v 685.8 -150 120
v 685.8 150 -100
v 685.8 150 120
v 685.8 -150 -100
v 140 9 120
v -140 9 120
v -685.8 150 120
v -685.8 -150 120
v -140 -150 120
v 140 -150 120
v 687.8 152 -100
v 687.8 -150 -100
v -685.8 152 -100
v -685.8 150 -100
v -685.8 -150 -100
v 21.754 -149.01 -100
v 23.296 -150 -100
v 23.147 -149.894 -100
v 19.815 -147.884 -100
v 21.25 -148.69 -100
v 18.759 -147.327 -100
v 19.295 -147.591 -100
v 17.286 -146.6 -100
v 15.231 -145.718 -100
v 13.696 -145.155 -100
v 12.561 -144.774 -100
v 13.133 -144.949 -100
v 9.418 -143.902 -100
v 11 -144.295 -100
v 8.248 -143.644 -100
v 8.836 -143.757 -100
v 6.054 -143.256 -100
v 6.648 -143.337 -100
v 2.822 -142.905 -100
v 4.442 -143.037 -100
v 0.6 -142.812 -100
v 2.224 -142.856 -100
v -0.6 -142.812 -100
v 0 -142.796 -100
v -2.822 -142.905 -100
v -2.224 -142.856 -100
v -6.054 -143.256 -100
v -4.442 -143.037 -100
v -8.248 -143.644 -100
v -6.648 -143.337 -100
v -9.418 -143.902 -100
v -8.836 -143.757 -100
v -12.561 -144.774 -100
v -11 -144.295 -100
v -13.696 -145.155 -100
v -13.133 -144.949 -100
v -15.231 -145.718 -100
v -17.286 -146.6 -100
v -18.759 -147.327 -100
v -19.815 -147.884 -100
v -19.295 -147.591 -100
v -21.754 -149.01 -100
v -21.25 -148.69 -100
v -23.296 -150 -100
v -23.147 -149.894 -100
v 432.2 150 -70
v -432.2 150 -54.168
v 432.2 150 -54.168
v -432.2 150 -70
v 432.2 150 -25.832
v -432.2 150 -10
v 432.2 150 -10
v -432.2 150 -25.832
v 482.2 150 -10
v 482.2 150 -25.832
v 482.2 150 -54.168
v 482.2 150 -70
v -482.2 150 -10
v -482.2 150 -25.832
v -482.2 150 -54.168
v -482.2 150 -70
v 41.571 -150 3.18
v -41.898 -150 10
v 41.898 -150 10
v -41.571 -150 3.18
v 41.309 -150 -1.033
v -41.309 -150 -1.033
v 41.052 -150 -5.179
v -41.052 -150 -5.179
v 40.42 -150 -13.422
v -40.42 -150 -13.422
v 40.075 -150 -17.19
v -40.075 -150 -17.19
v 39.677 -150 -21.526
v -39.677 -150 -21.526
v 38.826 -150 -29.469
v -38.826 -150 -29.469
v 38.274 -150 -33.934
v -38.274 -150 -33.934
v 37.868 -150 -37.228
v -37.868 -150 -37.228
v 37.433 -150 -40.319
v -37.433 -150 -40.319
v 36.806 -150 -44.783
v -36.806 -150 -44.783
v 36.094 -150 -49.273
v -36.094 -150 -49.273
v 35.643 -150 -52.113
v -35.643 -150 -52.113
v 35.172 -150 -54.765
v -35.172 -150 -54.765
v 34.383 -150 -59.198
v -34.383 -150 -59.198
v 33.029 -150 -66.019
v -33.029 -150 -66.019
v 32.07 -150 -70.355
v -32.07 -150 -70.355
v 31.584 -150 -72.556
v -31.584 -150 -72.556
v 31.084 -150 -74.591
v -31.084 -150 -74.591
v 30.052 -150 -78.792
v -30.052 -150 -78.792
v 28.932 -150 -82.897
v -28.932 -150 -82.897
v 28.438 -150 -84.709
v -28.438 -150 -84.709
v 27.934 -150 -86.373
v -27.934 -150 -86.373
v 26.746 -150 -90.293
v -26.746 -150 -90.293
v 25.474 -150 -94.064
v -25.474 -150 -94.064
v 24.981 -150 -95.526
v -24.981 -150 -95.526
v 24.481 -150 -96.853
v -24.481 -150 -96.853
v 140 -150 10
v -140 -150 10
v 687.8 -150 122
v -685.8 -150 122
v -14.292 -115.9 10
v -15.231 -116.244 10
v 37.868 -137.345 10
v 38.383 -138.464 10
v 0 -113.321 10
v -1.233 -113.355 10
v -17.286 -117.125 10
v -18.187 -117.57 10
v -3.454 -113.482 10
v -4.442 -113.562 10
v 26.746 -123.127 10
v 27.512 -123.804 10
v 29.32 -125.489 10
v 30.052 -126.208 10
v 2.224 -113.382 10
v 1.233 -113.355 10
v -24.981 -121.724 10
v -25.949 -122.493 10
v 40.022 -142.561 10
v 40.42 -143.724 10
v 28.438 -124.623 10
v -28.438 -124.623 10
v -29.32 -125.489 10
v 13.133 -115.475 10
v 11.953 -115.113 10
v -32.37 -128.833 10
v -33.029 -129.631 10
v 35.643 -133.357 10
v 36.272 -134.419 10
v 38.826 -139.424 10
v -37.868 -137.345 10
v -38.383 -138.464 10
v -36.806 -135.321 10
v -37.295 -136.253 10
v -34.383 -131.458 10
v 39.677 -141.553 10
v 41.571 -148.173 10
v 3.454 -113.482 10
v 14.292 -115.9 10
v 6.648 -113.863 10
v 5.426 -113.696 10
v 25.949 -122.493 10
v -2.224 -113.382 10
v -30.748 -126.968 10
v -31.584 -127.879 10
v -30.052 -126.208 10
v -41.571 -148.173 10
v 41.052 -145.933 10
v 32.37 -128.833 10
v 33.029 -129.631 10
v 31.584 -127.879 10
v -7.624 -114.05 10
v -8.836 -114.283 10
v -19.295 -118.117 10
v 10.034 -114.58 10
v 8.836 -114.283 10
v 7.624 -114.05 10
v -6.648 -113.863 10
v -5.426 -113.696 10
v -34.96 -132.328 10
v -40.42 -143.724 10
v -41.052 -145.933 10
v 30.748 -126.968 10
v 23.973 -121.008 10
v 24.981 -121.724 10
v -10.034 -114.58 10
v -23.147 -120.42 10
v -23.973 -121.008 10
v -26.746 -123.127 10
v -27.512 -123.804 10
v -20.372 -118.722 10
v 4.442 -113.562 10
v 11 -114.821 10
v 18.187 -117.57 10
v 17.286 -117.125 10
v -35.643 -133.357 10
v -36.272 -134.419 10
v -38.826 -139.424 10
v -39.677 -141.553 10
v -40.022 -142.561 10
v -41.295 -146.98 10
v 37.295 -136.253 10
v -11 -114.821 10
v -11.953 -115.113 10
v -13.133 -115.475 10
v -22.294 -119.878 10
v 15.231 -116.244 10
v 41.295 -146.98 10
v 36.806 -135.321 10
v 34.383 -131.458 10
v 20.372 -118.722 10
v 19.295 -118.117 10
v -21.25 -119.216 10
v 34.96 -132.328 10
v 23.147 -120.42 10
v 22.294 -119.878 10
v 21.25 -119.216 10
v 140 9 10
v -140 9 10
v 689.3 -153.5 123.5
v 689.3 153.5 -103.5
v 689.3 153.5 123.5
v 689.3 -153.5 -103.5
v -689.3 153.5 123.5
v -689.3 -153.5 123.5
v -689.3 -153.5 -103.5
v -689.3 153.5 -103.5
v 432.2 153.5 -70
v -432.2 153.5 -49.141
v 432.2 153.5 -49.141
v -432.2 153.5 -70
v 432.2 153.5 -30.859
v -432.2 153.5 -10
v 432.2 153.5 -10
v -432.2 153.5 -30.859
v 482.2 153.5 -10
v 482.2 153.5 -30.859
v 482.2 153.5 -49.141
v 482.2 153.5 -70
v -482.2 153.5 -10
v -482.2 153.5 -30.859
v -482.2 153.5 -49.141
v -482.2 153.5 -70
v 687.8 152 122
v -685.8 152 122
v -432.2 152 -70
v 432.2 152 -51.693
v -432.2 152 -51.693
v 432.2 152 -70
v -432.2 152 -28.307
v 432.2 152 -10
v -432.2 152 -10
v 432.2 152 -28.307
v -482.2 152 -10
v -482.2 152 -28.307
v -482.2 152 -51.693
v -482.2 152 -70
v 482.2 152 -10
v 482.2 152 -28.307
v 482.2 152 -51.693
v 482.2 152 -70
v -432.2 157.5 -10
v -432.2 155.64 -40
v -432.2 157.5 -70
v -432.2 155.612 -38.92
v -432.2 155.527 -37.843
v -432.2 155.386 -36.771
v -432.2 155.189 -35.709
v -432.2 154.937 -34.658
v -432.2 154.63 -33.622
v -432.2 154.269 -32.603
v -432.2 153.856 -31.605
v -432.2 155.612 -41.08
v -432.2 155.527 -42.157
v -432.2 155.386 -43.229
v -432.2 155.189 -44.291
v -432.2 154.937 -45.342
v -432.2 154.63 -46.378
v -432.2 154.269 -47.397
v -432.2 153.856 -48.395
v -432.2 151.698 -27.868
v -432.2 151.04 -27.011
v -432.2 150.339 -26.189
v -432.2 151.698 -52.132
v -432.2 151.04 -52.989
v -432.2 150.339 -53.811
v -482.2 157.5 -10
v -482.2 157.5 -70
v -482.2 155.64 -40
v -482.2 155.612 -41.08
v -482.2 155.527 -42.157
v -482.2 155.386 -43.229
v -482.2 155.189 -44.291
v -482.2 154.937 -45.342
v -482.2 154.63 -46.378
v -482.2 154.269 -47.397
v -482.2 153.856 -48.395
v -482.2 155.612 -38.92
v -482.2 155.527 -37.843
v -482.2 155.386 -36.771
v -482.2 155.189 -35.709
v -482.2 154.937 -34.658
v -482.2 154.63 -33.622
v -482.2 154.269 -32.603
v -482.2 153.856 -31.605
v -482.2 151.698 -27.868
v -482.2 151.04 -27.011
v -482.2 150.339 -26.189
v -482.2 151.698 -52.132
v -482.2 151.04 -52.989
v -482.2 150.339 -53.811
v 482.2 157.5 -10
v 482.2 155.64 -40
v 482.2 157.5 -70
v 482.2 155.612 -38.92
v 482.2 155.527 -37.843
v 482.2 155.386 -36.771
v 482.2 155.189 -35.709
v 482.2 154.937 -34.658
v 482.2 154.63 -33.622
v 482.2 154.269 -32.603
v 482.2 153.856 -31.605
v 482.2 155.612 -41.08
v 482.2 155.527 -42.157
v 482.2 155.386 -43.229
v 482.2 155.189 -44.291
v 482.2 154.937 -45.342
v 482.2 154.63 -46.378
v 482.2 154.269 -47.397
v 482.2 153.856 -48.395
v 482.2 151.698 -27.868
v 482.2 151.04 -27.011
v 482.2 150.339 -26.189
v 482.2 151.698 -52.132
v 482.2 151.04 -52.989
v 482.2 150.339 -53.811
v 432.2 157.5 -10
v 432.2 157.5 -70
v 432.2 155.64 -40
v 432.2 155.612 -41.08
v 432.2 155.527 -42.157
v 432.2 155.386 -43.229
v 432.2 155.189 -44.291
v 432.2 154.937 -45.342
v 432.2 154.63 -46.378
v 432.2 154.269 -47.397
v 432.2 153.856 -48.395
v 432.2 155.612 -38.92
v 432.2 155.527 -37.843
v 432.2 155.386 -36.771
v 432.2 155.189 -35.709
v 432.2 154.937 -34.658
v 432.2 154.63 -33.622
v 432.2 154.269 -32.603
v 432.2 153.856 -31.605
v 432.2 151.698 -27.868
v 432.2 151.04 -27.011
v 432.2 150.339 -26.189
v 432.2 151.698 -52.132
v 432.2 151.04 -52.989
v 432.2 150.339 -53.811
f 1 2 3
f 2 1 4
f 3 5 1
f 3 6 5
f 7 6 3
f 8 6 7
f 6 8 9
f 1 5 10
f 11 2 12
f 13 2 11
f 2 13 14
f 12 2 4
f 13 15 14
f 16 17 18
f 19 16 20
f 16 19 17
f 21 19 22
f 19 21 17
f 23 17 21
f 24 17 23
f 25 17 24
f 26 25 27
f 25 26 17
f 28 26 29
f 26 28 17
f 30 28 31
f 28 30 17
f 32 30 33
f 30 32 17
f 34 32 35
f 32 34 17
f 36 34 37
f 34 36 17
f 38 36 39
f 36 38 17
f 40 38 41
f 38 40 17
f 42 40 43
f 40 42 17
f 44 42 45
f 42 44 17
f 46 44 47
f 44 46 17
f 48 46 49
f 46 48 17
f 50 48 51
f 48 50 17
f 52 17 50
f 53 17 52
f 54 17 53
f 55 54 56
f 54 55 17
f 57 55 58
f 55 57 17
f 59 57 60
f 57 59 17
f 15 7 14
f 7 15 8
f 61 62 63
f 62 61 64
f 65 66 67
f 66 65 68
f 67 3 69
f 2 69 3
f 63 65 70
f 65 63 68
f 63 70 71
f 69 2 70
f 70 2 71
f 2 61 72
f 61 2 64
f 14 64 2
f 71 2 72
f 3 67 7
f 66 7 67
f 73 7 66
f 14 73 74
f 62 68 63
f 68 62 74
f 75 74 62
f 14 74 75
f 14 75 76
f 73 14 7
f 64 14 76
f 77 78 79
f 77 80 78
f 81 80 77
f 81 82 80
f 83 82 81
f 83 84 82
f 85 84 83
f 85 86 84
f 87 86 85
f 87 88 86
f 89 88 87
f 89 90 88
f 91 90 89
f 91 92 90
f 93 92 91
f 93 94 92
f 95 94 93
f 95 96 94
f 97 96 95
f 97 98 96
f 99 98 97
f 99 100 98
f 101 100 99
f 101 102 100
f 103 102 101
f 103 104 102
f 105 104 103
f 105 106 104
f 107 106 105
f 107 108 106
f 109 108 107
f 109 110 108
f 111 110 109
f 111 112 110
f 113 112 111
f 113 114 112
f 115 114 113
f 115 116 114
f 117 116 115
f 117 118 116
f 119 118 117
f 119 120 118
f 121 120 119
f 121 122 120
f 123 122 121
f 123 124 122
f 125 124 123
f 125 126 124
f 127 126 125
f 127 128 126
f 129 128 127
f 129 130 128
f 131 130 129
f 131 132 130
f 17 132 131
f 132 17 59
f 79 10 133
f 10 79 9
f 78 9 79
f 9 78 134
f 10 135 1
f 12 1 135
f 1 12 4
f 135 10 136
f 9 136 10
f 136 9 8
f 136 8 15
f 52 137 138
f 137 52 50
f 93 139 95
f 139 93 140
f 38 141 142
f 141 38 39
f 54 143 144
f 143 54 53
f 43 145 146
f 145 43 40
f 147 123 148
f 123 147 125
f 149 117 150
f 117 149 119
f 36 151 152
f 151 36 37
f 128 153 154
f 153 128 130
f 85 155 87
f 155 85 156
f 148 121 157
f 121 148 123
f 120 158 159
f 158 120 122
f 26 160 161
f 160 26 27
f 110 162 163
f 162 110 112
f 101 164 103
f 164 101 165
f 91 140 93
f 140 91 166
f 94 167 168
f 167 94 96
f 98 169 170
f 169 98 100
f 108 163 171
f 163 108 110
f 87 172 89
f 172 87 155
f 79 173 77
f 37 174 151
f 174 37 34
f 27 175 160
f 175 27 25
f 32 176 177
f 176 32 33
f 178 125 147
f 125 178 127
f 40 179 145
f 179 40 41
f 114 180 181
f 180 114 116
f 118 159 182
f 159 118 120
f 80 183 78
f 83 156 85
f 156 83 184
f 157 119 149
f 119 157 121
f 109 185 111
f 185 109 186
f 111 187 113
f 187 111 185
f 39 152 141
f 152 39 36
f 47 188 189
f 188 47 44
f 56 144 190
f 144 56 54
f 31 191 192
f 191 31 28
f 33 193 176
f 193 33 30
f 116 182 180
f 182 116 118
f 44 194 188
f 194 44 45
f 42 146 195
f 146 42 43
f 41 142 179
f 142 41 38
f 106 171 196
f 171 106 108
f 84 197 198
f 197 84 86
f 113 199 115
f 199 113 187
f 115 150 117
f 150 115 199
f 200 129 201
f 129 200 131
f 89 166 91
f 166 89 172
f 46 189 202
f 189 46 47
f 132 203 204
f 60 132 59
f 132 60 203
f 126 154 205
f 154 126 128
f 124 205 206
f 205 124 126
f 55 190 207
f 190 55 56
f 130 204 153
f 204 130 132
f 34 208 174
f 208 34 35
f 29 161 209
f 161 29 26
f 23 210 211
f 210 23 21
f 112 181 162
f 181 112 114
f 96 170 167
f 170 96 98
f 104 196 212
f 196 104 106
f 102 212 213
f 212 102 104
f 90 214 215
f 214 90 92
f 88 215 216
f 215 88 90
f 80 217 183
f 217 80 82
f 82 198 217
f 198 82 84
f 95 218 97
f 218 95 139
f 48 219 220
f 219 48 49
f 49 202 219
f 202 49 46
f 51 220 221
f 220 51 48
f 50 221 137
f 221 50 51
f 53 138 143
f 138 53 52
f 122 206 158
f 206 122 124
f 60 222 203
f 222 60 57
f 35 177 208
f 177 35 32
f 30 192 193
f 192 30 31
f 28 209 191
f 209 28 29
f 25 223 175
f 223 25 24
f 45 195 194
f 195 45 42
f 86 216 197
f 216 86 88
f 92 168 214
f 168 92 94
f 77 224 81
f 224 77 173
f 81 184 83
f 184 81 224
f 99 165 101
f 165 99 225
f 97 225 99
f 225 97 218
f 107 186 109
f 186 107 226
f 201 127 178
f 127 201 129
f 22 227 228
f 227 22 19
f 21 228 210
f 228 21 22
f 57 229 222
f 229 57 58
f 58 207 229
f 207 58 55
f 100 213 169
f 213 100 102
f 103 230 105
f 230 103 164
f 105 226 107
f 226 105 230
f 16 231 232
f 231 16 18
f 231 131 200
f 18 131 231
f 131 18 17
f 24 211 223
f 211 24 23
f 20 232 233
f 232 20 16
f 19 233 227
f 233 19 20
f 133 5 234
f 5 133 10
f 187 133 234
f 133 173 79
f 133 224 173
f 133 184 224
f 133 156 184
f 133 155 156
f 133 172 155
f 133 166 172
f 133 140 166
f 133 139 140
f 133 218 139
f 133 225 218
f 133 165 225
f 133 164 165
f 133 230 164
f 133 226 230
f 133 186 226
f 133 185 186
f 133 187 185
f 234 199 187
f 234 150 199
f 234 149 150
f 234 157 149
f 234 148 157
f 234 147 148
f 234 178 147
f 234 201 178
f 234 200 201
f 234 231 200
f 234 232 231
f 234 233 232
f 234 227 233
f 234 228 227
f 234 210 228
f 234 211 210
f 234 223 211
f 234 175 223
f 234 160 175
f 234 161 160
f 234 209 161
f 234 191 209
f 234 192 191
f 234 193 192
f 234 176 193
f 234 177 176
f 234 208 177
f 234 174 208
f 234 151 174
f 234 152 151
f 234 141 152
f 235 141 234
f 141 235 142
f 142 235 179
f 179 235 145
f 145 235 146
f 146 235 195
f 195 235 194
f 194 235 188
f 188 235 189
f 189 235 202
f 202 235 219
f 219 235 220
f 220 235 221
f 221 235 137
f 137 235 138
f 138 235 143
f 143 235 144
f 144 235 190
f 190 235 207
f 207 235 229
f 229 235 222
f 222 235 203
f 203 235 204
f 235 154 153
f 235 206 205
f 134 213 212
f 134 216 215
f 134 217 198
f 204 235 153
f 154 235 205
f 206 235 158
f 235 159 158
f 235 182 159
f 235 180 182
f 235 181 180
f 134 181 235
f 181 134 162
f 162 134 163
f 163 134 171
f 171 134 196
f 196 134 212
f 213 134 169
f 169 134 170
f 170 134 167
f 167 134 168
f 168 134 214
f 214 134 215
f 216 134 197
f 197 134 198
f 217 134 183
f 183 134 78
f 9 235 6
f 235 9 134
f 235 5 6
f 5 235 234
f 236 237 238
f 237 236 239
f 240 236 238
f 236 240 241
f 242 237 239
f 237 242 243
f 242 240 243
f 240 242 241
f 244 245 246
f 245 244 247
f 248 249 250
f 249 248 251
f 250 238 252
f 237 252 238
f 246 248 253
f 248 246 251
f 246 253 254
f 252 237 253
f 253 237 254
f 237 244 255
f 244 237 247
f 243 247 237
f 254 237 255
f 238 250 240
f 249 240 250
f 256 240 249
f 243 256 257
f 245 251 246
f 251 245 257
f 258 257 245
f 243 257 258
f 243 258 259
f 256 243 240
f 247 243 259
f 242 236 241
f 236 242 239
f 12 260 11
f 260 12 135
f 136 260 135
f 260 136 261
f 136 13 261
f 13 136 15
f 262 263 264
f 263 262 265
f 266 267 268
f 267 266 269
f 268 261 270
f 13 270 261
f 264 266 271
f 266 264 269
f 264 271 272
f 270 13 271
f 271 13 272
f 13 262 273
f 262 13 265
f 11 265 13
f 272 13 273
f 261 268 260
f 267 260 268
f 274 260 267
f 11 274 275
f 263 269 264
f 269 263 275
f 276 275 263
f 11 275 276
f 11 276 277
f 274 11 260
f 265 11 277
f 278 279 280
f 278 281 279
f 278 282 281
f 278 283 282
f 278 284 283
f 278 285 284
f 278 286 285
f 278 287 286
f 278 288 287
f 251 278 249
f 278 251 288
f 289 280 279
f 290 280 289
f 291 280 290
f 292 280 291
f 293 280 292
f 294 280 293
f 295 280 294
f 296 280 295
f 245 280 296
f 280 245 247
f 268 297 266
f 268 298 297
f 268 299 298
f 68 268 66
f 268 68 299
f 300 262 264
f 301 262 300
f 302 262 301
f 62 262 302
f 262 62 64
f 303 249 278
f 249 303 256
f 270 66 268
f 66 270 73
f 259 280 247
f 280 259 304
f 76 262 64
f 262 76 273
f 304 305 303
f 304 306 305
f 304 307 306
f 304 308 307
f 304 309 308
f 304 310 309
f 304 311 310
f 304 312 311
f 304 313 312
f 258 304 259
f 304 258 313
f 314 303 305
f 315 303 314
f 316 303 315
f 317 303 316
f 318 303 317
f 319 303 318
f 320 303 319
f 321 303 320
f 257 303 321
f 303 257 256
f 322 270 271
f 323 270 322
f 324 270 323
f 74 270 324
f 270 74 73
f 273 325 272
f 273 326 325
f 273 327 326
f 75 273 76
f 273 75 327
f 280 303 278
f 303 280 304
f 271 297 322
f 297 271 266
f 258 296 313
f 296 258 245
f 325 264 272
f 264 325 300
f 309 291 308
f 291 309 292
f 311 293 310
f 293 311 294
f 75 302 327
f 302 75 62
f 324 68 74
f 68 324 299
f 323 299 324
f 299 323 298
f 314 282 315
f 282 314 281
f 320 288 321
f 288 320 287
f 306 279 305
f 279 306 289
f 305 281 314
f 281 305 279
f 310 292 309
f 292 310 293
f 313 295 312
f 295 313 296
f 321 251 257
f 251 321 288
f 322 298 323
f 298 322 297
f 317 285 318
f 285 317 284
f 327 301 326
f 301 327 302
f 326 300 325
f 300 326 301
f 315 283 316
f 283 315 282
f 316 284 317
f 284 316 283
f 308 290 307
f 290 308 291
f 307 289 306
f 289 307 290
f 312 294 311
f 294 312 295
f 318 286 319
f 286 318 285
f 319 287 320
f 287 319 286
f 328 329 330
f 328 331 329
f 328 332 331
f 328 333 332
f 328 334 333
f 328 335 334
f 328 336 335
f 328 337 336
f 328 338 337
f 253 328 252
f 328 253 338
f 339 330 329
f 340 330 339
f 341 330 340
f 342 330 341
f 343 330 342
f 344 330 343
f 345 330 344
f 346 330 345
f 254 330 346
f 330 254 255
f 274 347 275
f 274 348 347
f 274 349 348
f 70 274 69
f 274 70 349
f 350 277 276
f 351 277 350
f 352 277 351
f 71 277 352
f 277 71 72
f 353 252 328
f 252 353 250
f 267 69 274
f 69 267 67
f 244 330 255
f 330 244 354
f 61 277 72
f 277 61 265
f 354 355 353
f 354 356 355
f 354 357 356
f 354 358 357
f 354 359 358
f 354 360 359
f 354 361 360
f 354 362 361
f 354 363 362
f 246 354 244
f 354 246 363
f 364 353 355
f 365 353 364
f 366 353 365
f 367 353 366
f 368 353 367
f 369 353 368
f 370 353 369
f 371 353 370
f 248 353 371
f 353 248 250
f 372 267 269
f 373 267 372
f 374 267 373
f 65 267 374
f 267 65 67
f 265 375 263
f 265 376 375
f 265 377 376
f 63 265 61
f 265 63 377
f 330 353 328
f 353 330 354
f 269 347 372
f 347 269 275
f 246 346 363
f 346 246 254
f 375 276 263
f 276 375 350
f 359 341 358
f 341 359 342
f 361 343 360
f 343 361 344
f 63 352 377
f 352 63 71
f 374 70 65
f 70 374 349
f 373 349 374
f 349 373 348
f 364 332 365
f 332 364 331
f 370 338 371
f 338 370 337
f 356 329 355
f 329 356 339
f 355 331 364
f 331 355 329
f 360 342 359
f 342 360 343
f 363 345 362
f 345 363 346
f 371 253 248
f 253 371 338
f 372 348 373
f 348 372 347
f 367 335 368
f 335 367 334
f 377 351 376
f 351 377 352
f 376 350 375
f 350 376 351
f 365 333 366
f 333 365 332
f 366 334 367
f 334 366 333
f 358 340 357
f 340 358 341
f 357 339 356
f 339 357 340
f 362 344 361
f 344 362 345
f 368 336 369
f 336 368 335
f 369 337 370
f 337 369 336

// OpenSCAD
// ====================================================================================
// REVOLUTIONARY TECHNOLOGY COMPANY & UNIVERSITY OF WASHINGTON DEPARTMENT OF PHYSICS
// Subsystem: otterbox_interior_dash.scad (Dual-Density Ruggedized Cockpit Shell)
// Core Partner: OtterBox Custom Automotive Engineering division
// Center Origin (0,0,0) = Geometric Center of the Steering Column Dash Port
// ====================================================================================

$fn = 120; // High-fidelity injection-mold tooling path resolution

// --- OtterBox Material Property Parameters (mm) ---
inch_to_mm         = 25.4;
dash_total_width   = 54.0 * inch_to_mm; // 1371.6 mm interior cabin cross-width
shell_thickness_pc = 5.50;              // High-strength Polycarbonate rigid skeleton core
skin_thickness_tpu = 3.50;              // Shock-absorbing soft-touch synthetic rubber outer layer

// Integrated Cockpit Component Cavity Pockets
univac_display_w   = 280.00;            // Main 36-bit diagnostics monitor cutout
iris_cam_pocket_d  = 55.00;             // Center-hub eye tracking module pocket

module dual_layer_otterbox_dash() {
    // 1. HARD INNER SKELETON LAYER (Molded Polycarbonate Core Base)
    color("DimGrey") {
        difference() {
            // Main horizontal dashboard beam architecture
            translate([-dash_total_width/2, -150, -100])
                cube([dash_total_width, 300, 220]);
            
            // Central core cutout passage for the 1969 manual steering shaft
            translate([0, -160, 0])
                rotate([-15, 0, 0]) // Matches 15-degree steering column angle rake
                    cylinder(d=85.0, h=400, center=true);
            
            // Deep instrument pocket recess for the Univac IX Dashboard screen
            translate([-univac_display_w/2, -151, 10])
                cube([univac_display_w, 160, 140]);
        }
    }

    // 2. SOFT IMPACT SHIELD SKIN (Overmolded Synthetic Rubber Texture Layer)
    color("DarkCharcoal") {
        translate([-dash_total_width/2 - skin_thickness_tpu, -150 - skin_thickness_tpu, -100 - skin_thickness_tpu])
            difference() {
                // Expanded protective exterior envelope dimension block
                cube([dash_total_width + (2*skin_thickness_tpu), 300 + (2*skin_thickness_tpu), 220 + (2*skin_thickness_tpu)]);
                // Hollow out the core so it slips seamlessly over the polycarbonate beam skeleton
                translate([skin_thickness_tpu, skin_thickness_tpu, skin_thickness_tpu])
                    cube([dash_total_width + 2, 302, 222]);
            }
    }
}

module cage_snap_lock_lugs() {
    // Custom molded heavy-duty retention clips based on phone case design patterns.
    // Snaps directly onto the roll bars to eliminate dash rattles under track conditions.
    for (x_offset = [-dash_total_width/3, dash_total_width/3]) {
        translate([x_offset, 135, -40]) {
            color("Black") {
                difference() {
                    cube([50, 45, 60], center=true);
                    // Snap clearance bore matched exactly to your 1-5/8" (41.275mm) cage tubes
                    rotate([0, 90, 0])
                        cylinder(d=41.28, h=52, center=true);
                }
            }
        }
    }
}

// --- Composite Interior Module Instantiation ---
union() {
    dual_layer_otterbox_dash();
    cage_snap_lock_lugs();
}
